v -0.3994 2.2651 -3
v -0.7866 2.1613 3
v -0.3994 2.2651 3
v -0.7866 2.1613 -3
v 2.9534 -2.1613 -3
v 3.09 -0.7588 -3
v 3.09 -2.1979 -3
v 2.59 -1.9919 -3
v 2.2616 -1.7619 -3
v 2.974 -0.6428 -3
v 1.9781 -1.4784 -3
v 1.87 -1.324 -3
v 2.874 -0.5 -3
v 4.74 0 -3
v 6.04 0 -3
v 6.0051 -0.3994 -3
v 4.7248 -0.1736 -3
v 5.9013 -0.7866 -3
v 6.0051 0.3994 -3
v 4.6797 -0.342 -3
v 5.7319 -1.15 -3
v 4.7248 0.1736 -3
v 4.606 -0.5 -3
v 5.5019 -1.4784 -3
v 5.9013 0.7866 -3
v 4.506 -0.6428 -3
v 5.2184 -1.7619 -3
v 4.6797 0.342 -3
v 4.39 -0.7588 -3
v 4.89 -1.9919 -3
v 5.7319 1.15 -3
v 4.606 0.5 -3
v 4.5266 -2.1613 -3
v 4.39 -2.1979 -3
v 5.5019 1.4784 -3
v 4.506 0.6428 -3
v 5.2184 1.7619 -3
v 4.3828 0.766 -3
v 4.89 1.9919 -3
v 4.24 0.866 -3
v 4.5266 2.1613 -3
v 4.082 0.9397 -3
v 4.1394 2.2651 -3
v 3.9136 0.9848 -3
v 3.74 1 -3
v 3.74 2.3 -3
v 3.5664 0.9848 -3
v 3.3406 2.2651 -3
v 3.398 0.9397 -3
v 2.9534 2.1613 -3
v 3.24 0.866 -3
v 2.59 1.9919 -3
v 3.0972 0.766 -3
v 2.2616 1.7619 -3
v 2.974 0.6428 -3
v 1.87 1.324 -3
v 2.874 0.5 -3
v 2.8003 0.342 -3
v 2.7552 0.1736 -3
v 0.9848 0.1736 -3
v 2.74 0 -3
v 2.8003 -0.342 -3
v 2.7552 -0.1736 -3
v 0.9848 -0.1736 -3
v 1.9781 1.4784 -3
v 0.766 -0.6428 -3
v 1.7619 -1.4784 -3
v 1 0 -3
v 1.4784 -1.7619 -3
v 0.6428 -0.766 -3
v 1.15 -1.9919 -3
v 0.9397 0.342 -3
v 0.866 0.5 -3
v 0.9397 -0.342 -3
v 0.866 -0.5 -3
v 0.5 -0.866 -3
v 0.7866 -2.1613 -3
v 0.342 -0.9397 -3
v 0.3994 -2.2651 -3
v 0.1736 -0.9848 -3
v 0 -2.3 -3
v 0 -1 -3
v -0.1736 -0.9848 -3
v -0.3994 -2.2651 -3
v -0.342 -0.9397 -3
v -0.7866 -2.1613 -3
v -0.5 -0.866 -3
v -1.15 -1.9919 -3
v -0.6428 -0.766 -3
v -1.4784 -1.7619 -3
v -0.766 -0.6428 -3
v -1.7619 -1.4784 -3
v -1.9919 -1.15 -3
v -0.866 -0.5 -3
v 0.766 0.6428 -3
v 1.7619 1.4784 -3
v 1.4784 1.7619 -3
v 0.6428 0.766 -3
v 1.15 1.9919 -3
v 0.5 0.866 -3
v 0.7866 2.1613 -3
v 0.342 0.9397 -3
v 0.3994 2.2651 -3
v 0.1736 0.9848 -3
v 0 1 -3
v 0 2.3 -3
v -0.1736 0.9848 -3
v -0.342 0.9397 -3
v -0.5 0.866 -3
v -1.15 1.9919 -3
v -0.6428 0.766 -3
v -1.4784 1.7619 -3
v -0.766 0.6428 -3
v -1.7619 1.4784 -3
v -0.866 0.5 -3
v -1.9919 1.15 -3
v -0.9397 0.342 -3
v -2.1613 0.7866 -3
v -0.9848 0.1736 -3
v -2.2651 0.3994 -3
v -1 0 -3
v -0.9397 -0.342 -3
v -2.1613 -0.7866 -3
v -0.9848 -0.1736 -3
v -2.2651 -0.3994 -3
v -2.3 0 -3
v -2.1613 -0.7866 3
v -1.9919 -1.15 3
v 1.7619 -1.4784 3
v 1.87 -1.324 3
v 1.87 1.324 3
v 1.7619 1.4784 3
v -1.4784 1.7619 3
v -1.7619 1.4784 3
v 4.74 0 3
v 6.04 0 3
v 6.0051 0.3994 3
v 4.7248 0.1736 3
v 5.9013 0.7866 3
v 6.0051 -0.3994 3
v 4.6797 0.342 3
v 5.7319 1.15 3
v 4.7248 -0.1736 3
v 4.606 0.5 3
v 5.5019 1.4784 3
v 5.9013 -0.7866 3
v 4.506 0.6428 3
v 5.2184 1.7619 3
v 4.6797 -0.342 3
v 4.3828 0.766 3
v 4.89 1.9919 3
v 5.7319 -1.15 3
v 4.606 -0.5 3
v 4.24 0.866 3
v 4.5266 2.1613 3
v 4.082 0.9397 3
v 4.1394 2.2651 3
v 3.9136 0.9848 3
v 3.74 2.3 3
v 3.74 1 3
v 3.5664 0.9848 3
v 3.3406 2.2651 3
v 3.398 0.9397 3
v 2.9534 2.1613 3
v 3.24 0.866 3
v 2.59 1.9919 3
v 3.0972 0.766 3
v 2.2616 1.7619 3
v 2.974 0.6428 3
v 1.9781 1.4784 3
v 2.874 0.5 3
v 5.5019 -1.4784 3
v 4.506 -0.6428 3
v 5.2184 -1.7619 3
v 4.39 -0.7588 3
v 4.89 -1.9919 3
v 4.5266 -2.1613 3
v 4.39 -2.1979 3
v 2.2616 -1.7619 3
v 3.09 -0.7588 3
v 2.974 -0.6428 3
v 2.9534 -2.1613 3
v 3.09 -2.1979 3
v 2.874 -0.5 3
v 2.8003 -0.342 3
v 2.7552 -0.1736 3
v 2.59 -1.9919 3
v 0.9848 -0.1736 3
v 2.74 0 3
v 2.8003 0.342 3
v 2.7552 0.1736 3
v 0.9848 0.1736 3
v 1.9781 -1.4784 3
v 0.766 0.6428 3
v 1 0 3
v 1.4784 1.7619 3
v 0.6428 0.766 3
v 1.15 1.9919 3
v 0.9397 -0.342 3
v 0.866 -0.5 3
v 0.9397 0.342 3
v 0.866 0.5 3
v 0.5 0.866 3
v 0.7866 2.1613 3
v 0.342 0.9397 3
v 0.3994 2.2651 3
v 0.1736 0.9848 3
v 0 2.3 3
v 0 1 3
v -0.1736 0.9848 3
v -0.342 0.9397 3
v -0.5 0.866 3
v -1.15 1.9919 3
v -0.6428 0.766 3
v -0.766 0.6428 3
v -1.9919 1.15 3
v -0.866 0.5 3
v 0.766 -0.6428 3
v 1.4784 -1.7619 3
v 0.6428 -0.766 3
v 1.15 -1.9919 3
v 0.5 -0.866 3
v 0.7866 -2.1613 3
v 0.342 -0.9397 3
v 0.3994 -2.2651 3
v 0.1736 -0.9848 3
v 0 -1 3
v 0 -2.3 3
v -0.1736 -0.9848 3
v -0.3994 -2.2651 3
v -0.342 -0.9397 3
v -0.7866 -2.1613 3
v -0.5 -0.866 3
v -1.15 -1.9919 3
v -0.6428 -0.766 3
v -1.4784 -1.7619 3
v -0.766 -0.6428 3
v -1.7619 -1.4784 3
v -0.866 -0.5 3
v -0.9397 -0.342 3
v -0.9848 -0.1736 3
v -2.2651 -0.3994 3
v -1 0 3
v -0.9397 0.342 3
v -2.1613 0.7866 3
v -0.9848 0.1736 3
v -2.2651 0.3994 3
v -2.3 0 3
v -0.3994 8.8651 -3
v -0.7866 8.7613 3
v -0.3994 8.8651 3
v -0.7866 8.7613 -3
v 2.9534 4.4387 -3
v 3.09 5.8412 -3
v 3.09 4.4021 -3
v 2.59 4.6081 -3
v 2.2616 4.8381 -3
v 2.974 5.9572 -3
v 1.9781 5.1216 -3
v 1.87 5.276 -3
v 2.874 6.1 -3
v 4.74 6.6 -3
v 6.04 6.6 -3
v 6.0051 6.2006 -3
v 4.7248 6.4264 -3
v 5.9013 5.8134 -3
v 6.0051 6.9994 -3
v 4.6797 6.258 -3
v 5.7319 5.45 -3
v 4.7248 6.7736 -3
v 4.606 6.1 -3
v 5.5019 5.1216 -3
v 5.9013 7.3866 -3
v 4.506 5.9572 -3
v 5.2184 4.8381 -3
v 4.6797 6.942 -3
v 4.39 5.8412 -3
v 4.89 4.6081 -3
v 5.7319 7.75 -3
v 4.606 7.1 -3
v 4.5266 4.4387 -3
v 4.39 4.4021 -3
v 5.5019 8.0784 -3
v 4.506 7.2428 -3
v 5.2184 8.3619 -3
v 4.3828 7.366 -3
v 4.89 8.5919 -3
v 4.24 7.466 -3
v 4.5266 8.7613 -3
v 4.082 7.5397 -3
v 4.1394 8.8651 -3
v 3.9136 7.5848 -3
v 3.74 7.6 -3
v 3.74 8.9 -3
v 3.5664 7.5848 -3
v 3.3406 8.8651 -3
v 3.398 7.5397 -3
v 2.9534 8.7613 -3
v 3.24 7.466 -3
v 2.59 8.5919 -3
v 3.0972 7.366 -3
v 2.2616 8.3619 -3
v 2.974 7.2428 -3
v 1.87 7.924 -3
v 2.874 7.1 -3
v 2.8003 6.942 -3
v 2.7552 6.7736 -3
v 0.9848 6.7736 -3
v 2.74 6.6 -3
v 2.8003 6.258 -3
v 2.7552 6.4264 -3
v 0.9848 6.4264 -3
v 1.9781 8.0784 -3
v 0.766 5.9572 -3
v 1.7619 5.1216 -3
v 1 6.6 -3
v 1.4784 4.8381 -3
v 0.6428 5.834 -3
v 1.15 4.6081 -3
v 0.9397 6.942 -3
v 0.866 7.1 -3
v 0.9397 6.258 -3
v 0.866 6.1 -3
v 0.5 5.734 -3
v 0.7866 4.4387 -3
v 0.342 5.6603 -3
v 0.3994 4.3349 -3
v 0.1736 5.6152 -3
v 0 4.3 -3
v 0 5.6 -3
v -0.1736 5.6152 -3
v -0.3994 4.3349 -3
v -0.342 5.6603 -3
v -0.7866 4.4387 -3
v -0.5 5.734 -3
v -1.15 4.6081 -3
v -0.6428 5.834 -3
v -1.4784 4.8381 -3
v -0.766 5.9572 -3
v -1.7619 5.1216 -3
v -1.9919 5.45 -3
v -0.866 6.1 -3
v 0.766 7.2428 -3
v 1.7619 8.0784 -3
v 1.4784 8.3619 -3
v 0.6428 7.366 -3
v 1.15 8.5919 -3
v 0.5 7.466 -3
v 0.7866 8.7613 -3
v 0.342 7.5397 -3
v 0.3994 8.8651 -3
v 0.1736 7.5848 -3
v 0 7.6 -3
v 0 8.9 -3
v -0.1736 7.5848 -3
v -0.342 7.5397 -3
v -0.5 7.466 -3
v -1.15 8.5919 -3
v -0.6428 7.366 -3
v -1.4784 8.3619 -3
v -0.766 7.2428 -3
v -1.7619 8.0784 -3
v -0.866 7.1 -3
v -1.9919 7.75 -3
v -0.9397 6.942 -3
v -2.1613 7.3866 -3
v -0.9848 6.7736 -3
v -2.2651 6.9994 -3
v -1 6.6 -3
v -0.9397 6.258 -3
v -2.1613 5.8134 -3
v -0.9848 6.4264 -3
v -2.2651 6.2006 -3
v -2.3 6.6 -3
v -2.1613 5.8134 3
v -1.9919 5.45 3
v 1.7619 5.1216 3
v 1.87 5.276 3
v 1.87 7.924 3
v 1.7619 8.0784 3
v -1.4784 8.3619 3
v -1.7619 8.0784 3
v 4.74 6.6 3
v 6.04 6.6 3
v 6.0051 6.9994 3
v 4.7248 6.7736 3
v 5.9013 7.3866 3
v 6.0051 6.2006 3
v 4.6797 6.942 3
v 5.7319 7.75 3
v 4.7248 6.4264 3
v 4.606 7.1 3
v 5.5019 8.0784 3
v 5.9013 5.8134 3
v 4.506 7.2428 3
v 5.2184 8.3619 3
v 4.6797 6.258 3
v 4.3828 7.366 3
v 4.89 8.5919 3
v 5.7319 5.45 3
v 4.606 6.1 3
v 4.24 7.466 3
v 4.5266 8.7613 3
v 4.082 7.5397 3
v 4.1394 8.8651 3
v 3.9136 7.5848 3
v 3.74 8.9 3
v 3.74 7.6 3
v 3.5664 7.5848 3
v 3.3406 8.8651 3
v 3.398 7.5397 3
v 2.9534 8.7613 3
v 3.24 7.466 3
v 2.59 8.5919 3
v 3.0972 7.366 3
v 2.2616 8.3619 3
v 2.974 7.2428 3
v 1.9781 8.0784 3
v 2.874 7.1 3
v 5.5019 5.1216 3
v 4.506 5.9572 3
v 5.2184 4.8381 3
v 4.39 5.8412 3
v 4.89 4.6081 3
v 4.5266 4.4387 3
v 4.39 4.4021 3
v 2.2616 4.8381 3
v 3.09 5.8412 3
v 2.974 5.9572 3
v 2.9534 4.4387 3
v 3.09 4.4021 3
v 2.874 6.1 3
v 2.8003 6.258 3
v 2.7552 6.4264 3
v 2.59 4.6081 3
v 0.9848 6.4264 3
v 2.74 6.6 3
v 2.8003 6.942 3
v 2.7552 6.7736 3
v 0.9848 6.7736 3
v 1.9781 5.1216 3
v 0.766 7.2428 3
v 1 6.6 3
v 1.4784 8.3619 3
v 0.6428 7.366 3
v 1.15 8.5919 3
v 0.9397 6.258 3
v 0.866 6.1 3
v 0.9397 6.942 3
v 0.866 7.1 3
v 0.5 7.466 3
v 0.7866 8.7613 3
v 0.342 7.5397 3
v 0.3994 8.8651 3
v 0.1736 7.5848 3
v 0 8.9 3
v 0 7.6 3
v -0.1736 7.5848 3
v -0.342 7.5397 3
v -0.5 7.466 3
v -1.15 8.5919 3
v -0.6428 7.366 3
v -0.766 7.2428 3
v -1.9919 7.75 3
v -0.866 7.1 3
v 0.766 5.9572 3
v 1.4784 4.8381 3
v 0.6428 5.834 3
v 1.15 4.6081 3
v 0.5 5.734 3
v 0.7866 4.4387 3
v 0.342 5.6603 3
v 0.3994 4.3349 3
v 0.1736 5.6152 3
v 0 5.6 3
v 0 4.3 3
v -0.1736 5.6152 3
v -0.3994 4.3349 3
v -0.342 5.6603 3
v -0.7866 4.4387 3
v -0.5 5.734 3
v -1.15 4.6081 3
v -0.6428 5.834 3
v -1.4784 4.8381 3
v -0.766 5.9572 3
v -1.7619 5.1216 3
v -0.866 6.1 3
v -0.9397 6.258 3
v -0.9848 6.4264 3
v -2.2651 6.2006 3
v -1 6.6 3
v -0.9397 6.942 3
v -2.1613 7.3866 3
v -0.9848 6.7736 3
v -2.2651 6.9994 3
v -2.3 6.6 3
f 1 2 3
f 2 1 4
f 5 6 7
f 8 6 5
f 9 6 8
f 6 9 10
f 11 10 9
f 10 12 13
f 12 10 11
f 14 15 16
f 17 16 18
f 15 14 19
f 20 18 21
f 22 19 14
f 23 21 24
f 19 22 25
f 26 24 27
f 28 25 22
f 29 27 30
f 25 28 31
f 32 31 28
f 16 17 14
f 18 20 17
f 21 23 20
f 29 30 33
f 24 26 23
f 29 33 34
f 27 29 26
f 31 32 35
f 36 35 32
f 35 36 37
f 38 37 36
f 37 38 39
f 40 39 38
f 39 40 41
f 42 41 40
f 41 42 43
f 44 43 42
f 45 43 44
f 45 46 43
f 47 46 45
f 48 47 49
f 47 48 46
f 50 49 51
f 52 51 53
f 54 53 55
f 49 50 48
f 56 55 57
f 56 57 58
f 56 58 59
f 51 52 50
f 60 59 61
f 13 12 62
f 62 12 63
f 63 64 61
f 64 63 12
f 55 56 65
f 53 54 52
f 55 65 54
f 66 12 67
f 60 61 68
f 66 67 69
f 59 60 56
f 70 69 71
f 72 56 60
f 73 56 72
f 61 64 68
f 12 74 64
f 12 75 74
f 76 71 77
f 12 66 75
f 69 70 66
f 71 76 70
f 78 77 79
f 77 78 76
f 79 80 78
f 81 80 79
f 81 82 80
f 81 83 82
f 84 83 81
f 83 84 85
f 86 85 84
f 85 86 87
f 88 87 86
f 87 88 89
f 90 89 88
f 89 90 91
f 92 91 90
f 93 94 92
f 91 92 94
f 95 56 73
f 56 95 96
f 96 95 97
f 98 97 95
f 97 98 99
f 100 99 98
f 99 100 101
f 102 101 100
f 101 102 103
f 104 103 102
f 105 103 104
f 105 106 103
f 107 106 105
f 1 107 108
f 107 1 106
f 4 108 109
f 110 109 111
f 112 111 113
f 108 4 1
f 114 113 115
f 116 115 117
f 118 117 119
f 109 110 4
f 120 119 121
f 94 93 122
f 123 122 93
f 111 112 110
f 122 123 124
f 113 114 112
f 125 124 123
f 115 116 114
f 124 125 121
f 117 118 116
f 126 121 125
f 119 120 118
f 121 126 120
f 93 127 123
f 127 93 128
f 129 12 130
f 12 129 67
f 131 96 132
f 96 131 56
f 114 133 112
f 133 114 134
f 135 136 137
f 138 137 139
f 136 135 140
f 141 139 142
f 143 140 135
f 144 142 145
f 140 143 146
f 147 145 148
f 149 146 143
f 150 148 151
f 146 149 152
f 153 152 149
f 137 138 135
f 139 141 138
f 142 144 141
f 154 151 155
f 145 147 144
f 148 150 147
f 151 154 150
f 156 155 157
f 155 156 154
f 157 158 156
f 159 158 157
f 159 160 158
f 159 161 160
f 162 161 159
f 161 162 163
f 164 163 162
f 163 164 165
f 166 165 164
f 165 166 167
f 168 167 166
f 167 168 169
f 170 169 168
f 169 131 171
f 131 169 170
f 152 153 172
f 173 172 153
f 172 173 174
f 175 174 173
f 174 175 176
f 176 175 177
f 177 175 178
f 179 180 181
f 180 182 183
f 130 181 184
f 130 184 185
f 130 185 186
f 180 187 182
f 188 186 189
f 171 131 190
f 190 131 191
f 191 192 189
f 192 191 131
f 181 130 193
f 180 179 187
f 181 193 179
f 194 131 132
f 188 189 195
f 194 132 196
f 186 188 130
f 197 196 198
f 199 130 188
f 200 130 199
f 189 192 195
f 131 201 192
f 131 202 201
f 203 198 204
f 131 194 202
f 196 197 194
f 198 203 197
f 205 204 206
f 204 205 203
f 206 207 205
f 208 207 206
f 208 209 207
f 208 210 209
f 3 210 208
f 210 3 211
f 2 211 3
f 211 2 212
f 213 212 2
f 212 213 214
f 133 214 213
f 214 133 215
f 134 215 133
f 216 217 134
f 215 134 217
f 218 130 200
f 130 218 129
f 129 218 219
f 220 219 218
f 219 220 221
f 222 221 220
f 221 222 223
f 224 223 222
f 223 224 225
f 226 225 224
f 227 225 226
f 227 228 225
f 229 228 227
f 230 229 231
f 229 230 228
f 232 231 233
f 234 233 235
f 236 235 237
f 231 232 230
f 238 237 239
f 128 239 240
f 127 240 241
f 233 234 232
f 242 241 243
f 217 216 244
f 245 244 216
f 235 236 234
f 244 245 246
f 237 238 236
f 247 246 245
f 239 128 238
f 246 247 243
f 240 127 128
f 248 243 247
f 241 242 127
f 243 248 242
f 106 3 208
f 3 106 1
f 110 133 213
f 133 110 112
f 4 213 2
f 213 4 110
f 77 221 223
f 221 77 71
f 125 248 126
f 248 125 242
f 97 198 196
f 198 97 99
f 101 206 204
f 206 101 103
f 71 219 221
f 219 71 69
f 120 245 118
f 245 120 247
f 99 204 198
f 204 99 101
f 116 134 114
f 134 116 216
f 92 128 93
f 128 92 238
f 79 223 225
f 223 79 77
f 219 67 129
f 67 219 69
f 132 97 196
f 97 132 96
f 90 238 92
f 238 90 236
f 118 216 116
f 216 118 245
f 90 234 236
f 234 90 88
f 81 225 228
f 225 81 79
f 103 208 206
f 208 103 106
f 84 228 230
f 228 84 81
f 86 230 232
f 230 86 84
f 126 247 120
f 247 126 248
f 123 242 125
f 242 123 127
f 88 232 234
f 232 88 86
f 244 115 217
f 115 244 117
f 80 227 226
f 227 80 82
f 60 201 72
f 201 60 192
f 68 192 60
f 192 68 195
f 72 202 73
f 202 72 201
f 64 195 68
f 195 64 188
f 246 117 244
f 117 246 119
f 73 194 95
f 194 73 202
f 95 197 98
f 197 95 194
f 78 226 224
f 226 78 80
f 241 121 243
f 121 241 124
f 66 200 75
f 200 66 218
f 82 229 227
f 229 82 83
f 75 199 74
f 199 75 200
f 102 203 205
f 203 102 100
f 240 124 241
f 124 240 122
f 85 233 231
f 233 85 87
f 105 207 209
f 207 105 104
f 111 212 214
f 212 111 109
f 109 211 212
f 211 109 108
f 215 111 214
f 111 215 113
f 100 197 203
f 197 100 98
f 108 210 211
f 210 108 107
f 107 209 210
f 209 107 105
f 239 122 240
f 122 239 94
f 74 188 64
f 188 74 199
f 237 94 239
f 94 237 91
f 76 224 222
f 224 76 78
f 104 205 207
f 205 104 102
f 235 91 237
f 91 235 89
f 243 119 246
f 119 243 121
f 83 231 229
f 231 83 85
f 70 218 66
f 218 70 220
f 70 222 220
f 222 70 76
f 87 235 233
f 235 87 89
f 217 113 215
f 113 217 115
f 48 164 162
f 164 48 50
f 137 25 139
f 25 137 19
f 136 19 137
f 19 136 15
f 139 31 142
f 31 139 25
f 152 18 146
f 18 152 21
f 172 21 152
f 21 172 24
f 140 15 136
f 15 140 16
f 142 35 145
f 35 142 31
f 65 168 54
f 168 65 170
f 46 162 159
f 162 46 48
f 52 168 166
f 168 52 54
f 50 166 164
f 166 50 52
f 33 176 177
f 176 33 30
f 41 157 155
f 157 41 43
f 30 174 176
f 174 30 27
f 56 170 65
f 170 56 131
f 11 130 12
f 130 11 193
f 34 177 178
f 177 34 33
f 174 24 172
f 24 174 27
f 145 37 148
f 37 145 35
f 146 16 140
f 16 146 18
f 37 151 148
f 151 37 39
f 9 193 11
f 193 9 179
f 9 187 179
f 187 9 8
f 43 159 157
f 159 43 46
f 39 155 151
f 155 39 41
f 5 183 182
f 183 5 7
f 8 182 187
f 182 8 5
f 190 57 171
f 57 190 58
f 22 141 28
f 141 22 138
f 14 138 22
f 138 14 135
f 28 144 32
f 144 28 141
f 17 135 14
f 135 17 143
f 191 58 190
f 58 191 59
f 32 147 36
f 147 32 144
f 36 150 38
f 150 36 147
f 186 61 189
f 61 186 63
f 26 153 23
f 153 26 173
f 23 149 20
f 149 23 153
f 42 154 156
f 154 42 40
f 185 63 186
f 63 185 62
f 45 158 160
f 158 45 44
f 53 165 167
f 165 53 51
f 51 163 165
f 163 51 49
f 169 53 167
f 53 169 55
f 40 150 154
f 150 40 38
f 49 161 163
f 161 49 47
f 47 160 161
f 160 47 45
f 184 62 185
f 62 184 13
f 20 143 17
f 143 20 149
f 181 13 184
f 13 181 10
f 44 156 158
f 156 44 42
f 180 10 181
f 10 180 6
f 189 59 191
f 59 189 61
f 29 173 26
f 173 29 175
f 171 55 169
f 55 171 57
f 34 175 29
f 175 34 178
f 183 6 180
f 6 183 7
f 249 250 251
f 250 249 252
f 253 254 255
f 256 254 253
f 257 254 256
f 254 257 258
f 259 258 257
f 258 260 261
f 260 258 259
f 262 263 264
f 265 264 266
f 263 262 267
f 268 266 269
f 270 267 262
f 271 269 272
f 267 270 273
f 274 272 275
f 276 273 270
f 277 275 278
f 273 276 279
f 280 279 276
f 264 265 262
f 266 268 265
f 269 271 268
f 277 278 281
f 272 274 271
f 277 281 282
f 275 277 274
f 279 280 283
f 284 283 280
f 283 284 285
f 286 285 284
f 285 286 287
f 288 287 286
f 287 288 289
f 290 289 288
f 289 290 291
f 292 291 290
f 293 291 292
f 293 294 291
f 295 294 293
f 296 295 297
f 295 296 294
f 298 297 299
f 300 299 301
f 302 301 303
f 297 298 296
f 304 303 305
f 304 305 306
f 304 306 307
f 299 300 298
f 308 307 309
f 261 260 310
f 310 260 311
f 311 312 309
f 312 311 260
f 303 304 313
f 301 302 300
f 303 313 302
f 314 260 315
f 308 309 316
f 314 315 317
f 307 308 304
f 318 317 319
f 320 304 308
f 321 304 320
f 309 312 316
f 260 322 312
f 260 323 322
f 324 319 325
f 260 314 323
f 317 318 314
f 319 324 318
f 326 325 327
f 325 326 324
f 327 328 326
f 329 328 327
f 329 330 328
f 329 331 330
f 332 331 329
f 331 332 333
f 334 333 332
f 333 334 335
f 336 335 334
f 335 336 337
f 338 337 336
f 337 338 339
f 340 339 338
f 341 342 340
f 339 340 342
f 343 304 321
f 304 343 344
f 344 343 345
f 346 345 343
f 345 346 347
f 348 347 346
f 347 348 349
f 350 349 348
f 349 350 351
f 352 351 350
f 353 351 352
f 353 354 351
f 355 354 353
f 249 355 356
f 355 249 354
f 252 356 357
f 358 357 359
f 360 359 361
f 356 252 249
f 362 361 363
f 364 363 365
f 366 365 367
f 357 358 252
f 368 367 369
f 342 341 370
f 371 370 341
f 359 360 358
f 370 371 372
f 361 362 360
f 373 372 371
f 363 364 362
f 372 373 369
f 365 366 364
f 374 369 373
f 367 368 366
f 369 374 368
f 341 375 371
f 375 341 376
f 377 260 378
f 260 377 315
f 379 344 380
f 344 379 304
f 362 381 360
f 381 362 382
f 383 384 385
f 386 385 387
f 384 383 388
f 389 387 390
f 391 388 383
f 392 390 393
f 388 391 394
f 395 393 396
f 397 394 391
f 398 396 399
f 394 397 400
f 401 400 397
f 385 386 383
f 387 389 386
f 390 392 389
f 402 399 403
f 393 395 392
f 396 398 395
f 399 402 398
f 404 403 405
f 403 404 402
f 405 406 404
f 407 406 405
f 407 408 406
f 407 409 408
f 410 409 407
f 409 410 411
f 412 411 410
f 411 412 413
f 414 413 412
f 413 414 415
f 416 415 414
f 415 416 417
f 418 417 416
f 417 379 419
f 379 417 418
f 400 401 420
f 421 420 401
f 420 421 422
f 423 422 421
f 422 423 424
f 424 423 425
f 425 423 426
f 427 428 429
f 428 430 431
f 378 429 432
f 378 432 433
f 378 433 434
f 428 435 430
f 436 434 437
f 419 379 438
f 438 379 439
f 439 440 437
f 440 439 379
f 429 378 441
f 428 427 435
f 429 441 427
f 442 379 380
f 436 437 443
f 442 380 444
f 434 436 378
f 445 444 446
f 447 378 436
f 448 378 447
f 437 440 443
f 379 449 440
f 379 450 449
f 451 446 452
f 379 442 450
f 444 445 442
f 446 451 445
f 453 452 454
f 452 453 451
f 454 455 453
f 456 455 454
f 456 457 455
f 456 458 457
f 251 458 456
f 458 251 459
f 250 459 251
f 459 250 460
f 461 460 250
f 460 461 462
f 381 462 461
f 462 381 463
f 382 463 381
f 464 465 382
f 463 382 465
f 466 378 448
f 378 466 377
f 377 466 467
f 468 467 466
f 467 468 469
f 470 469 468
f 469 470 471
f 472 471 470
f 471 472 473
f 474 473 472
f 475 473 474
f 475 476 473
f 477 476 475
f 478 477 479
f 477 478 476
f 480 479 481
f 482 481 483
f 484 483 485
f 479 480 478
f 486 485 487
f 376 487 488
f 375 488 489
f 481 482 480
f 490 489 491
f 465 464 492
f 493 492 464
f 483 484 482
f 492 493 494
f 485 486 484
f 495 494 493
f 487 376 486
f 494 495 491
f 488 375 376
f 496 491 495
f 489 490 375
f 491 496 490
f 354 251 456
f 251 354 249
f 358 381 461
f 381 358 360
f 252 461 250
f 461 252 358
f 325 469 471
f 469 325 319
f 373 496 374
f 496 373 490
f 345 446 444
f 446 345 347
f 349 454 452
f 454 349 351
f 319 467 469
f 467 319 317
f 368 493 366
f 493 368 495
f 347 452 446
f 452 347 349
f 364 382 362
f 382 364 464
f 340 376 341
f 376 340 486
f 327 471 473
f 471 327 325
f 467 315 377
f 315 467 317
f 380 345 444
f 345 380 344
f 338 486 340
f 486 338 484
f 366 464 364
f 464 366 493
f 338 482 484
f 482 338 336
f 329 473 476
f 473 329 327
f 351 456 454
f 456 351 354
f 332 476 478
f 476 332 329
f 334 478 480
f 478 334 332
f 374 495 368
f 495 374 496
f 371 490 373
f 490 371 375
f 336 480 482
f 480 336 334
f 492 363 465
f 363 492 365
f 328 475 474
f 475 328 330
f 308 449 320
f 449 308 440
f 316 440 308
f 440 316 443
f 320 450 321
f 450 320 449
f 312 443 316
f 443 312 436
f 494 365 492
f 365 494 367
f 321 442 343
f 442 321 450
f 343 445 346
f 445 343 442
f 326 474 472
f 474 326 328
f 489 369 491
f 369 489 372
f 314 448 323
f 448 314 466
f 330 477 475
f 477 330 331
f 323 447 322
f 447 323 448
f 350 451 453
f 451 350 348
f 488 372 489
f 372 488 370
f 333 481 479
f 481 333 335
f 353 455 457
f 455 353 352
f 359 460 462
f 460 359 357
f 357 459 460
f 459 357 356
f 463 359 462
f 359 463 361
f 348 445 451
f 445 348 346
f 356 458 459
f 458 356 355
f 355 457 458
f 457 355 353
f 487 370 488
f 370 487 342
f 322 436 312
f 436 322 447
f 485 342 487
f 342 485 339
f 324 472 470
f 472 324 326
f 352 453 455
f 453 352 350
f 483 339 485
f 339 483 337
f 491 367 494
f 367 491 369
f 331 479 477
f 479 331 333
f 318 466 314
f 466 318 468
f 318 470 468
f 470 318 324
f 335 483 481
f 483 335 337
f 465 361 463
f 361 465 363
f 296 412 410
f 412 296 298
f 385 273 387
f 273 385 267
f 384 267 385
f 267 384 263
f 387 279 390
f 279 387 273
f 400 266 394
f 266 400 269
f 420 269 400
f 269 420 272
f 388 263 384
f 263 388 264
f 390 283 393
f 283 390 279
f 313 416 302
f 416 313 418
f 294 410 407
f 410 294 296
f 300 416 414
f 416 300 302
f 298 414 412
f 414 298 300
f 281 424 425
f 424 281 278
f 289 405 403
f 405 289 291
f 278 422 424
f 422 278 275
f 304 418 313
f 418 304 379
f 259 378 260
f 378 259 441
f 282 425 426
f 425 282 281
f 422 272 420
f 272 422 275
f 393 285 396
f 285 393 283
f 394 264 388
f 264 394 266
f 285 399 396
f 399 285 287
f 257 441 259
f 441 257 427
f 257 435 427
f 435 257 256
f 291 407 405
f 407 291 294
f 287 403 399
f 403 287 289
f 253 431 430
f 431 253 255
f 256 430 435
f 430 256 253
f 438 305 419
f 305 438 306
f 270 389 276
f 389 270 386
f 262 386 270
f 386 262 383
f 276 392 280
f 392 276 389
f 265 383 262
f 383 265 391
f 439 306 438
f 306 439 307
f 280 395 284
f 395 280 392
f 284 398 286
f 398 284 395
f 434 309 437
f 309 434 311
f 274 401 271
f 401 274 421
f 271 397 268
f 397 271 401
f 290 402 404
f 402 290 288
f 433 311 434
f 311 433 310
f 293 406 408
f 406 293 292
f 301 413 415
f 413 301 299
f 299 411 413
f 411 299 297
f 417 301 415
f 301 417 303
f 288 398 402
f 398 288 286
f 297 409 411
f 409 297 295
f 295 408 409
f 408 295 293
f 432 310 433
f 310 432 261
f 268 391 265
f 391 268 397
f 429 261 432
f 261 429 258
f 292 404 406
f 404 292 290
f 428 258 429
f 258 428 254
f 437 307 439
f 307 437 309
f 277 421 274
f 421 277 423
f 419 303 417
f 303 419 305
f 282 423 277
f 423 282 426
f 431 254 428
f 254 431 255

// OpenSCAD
//Magnetic Headphone Keeper
include <MCAD/boxes.scad>

/* [Global] */
//Type of Headphone Cord
type=1; //[0:Rectangular, 1:Round]
//Wall Thickness
wallTh=1.3;
//Height
height=6;
//Facets
$fn=36;

/* [Cord Dimensions] */
//Cord Diameter
cordDia=2;

/* [Headphone Holder Dimensions] */
//Cord Thickness (rectangular)
xDim=4.4;
//Cord Width (rectangular)
yDim=1.5;
//Corner Radius (rectangular)
corner=2;
//Headphone Cord Diameter (round)
headPhDia=2;


/* [Hidden] */
//overage for cutting and joining
ovr=0.001;
//cord radius
cordR=cordDia/2;
//headphone cord radius
headPhR=headPhDia/2;


module cordHolder() {
  difference() {
    cylinder(r=cordR+wallTh, h=height, center=true);
    cylinder(r=cordR, h=height+ovr, center=true);
  } //end diff
} //end cordHolder


module rectHolder() {
  difference() {
    //outter box
    roundedBox([xDim+wallTh*2, yDim+wallTh*2, height], corner, sidesonly=1);
    //cutout 
    cube([xDim, yDim, height+ovr], center=true);
    //opening slot
    translate([0, -xDim/2, 0]) cube([yDim, xDim, height+ovr], center=true);

  } // end diff
} //end rect holder


module roundHolder() {
  difference() {
    cylinder(r=headPhR+wallTh, h=height, center=true);
    cylinder(r=headPhR, h=height+ovr, center=true);
    translate([0, -headPhR, 0]) cube([headPhR*1.3, headPhR*3, height+ovr], center=true);
  }
} //end round holder

module joinParts(type=0) {
  union() {
    cordHolder();
    if (type==0) {
      translate([cordR+wallTh+(xDim+wallTh*2)/2.5, 0, 0]) rectHolder();      
    } //end rectangular

    if (type==1) {
      translate([cordR+wallTh+(cordR+wallTh*2)/2.5, 0, 0]) roundHolder();
    } //end round
  } //end union
} //end join parts

joinParts(type);
translate([0, (cordDia+wallTh)*2, 0]) joinParts(type);
